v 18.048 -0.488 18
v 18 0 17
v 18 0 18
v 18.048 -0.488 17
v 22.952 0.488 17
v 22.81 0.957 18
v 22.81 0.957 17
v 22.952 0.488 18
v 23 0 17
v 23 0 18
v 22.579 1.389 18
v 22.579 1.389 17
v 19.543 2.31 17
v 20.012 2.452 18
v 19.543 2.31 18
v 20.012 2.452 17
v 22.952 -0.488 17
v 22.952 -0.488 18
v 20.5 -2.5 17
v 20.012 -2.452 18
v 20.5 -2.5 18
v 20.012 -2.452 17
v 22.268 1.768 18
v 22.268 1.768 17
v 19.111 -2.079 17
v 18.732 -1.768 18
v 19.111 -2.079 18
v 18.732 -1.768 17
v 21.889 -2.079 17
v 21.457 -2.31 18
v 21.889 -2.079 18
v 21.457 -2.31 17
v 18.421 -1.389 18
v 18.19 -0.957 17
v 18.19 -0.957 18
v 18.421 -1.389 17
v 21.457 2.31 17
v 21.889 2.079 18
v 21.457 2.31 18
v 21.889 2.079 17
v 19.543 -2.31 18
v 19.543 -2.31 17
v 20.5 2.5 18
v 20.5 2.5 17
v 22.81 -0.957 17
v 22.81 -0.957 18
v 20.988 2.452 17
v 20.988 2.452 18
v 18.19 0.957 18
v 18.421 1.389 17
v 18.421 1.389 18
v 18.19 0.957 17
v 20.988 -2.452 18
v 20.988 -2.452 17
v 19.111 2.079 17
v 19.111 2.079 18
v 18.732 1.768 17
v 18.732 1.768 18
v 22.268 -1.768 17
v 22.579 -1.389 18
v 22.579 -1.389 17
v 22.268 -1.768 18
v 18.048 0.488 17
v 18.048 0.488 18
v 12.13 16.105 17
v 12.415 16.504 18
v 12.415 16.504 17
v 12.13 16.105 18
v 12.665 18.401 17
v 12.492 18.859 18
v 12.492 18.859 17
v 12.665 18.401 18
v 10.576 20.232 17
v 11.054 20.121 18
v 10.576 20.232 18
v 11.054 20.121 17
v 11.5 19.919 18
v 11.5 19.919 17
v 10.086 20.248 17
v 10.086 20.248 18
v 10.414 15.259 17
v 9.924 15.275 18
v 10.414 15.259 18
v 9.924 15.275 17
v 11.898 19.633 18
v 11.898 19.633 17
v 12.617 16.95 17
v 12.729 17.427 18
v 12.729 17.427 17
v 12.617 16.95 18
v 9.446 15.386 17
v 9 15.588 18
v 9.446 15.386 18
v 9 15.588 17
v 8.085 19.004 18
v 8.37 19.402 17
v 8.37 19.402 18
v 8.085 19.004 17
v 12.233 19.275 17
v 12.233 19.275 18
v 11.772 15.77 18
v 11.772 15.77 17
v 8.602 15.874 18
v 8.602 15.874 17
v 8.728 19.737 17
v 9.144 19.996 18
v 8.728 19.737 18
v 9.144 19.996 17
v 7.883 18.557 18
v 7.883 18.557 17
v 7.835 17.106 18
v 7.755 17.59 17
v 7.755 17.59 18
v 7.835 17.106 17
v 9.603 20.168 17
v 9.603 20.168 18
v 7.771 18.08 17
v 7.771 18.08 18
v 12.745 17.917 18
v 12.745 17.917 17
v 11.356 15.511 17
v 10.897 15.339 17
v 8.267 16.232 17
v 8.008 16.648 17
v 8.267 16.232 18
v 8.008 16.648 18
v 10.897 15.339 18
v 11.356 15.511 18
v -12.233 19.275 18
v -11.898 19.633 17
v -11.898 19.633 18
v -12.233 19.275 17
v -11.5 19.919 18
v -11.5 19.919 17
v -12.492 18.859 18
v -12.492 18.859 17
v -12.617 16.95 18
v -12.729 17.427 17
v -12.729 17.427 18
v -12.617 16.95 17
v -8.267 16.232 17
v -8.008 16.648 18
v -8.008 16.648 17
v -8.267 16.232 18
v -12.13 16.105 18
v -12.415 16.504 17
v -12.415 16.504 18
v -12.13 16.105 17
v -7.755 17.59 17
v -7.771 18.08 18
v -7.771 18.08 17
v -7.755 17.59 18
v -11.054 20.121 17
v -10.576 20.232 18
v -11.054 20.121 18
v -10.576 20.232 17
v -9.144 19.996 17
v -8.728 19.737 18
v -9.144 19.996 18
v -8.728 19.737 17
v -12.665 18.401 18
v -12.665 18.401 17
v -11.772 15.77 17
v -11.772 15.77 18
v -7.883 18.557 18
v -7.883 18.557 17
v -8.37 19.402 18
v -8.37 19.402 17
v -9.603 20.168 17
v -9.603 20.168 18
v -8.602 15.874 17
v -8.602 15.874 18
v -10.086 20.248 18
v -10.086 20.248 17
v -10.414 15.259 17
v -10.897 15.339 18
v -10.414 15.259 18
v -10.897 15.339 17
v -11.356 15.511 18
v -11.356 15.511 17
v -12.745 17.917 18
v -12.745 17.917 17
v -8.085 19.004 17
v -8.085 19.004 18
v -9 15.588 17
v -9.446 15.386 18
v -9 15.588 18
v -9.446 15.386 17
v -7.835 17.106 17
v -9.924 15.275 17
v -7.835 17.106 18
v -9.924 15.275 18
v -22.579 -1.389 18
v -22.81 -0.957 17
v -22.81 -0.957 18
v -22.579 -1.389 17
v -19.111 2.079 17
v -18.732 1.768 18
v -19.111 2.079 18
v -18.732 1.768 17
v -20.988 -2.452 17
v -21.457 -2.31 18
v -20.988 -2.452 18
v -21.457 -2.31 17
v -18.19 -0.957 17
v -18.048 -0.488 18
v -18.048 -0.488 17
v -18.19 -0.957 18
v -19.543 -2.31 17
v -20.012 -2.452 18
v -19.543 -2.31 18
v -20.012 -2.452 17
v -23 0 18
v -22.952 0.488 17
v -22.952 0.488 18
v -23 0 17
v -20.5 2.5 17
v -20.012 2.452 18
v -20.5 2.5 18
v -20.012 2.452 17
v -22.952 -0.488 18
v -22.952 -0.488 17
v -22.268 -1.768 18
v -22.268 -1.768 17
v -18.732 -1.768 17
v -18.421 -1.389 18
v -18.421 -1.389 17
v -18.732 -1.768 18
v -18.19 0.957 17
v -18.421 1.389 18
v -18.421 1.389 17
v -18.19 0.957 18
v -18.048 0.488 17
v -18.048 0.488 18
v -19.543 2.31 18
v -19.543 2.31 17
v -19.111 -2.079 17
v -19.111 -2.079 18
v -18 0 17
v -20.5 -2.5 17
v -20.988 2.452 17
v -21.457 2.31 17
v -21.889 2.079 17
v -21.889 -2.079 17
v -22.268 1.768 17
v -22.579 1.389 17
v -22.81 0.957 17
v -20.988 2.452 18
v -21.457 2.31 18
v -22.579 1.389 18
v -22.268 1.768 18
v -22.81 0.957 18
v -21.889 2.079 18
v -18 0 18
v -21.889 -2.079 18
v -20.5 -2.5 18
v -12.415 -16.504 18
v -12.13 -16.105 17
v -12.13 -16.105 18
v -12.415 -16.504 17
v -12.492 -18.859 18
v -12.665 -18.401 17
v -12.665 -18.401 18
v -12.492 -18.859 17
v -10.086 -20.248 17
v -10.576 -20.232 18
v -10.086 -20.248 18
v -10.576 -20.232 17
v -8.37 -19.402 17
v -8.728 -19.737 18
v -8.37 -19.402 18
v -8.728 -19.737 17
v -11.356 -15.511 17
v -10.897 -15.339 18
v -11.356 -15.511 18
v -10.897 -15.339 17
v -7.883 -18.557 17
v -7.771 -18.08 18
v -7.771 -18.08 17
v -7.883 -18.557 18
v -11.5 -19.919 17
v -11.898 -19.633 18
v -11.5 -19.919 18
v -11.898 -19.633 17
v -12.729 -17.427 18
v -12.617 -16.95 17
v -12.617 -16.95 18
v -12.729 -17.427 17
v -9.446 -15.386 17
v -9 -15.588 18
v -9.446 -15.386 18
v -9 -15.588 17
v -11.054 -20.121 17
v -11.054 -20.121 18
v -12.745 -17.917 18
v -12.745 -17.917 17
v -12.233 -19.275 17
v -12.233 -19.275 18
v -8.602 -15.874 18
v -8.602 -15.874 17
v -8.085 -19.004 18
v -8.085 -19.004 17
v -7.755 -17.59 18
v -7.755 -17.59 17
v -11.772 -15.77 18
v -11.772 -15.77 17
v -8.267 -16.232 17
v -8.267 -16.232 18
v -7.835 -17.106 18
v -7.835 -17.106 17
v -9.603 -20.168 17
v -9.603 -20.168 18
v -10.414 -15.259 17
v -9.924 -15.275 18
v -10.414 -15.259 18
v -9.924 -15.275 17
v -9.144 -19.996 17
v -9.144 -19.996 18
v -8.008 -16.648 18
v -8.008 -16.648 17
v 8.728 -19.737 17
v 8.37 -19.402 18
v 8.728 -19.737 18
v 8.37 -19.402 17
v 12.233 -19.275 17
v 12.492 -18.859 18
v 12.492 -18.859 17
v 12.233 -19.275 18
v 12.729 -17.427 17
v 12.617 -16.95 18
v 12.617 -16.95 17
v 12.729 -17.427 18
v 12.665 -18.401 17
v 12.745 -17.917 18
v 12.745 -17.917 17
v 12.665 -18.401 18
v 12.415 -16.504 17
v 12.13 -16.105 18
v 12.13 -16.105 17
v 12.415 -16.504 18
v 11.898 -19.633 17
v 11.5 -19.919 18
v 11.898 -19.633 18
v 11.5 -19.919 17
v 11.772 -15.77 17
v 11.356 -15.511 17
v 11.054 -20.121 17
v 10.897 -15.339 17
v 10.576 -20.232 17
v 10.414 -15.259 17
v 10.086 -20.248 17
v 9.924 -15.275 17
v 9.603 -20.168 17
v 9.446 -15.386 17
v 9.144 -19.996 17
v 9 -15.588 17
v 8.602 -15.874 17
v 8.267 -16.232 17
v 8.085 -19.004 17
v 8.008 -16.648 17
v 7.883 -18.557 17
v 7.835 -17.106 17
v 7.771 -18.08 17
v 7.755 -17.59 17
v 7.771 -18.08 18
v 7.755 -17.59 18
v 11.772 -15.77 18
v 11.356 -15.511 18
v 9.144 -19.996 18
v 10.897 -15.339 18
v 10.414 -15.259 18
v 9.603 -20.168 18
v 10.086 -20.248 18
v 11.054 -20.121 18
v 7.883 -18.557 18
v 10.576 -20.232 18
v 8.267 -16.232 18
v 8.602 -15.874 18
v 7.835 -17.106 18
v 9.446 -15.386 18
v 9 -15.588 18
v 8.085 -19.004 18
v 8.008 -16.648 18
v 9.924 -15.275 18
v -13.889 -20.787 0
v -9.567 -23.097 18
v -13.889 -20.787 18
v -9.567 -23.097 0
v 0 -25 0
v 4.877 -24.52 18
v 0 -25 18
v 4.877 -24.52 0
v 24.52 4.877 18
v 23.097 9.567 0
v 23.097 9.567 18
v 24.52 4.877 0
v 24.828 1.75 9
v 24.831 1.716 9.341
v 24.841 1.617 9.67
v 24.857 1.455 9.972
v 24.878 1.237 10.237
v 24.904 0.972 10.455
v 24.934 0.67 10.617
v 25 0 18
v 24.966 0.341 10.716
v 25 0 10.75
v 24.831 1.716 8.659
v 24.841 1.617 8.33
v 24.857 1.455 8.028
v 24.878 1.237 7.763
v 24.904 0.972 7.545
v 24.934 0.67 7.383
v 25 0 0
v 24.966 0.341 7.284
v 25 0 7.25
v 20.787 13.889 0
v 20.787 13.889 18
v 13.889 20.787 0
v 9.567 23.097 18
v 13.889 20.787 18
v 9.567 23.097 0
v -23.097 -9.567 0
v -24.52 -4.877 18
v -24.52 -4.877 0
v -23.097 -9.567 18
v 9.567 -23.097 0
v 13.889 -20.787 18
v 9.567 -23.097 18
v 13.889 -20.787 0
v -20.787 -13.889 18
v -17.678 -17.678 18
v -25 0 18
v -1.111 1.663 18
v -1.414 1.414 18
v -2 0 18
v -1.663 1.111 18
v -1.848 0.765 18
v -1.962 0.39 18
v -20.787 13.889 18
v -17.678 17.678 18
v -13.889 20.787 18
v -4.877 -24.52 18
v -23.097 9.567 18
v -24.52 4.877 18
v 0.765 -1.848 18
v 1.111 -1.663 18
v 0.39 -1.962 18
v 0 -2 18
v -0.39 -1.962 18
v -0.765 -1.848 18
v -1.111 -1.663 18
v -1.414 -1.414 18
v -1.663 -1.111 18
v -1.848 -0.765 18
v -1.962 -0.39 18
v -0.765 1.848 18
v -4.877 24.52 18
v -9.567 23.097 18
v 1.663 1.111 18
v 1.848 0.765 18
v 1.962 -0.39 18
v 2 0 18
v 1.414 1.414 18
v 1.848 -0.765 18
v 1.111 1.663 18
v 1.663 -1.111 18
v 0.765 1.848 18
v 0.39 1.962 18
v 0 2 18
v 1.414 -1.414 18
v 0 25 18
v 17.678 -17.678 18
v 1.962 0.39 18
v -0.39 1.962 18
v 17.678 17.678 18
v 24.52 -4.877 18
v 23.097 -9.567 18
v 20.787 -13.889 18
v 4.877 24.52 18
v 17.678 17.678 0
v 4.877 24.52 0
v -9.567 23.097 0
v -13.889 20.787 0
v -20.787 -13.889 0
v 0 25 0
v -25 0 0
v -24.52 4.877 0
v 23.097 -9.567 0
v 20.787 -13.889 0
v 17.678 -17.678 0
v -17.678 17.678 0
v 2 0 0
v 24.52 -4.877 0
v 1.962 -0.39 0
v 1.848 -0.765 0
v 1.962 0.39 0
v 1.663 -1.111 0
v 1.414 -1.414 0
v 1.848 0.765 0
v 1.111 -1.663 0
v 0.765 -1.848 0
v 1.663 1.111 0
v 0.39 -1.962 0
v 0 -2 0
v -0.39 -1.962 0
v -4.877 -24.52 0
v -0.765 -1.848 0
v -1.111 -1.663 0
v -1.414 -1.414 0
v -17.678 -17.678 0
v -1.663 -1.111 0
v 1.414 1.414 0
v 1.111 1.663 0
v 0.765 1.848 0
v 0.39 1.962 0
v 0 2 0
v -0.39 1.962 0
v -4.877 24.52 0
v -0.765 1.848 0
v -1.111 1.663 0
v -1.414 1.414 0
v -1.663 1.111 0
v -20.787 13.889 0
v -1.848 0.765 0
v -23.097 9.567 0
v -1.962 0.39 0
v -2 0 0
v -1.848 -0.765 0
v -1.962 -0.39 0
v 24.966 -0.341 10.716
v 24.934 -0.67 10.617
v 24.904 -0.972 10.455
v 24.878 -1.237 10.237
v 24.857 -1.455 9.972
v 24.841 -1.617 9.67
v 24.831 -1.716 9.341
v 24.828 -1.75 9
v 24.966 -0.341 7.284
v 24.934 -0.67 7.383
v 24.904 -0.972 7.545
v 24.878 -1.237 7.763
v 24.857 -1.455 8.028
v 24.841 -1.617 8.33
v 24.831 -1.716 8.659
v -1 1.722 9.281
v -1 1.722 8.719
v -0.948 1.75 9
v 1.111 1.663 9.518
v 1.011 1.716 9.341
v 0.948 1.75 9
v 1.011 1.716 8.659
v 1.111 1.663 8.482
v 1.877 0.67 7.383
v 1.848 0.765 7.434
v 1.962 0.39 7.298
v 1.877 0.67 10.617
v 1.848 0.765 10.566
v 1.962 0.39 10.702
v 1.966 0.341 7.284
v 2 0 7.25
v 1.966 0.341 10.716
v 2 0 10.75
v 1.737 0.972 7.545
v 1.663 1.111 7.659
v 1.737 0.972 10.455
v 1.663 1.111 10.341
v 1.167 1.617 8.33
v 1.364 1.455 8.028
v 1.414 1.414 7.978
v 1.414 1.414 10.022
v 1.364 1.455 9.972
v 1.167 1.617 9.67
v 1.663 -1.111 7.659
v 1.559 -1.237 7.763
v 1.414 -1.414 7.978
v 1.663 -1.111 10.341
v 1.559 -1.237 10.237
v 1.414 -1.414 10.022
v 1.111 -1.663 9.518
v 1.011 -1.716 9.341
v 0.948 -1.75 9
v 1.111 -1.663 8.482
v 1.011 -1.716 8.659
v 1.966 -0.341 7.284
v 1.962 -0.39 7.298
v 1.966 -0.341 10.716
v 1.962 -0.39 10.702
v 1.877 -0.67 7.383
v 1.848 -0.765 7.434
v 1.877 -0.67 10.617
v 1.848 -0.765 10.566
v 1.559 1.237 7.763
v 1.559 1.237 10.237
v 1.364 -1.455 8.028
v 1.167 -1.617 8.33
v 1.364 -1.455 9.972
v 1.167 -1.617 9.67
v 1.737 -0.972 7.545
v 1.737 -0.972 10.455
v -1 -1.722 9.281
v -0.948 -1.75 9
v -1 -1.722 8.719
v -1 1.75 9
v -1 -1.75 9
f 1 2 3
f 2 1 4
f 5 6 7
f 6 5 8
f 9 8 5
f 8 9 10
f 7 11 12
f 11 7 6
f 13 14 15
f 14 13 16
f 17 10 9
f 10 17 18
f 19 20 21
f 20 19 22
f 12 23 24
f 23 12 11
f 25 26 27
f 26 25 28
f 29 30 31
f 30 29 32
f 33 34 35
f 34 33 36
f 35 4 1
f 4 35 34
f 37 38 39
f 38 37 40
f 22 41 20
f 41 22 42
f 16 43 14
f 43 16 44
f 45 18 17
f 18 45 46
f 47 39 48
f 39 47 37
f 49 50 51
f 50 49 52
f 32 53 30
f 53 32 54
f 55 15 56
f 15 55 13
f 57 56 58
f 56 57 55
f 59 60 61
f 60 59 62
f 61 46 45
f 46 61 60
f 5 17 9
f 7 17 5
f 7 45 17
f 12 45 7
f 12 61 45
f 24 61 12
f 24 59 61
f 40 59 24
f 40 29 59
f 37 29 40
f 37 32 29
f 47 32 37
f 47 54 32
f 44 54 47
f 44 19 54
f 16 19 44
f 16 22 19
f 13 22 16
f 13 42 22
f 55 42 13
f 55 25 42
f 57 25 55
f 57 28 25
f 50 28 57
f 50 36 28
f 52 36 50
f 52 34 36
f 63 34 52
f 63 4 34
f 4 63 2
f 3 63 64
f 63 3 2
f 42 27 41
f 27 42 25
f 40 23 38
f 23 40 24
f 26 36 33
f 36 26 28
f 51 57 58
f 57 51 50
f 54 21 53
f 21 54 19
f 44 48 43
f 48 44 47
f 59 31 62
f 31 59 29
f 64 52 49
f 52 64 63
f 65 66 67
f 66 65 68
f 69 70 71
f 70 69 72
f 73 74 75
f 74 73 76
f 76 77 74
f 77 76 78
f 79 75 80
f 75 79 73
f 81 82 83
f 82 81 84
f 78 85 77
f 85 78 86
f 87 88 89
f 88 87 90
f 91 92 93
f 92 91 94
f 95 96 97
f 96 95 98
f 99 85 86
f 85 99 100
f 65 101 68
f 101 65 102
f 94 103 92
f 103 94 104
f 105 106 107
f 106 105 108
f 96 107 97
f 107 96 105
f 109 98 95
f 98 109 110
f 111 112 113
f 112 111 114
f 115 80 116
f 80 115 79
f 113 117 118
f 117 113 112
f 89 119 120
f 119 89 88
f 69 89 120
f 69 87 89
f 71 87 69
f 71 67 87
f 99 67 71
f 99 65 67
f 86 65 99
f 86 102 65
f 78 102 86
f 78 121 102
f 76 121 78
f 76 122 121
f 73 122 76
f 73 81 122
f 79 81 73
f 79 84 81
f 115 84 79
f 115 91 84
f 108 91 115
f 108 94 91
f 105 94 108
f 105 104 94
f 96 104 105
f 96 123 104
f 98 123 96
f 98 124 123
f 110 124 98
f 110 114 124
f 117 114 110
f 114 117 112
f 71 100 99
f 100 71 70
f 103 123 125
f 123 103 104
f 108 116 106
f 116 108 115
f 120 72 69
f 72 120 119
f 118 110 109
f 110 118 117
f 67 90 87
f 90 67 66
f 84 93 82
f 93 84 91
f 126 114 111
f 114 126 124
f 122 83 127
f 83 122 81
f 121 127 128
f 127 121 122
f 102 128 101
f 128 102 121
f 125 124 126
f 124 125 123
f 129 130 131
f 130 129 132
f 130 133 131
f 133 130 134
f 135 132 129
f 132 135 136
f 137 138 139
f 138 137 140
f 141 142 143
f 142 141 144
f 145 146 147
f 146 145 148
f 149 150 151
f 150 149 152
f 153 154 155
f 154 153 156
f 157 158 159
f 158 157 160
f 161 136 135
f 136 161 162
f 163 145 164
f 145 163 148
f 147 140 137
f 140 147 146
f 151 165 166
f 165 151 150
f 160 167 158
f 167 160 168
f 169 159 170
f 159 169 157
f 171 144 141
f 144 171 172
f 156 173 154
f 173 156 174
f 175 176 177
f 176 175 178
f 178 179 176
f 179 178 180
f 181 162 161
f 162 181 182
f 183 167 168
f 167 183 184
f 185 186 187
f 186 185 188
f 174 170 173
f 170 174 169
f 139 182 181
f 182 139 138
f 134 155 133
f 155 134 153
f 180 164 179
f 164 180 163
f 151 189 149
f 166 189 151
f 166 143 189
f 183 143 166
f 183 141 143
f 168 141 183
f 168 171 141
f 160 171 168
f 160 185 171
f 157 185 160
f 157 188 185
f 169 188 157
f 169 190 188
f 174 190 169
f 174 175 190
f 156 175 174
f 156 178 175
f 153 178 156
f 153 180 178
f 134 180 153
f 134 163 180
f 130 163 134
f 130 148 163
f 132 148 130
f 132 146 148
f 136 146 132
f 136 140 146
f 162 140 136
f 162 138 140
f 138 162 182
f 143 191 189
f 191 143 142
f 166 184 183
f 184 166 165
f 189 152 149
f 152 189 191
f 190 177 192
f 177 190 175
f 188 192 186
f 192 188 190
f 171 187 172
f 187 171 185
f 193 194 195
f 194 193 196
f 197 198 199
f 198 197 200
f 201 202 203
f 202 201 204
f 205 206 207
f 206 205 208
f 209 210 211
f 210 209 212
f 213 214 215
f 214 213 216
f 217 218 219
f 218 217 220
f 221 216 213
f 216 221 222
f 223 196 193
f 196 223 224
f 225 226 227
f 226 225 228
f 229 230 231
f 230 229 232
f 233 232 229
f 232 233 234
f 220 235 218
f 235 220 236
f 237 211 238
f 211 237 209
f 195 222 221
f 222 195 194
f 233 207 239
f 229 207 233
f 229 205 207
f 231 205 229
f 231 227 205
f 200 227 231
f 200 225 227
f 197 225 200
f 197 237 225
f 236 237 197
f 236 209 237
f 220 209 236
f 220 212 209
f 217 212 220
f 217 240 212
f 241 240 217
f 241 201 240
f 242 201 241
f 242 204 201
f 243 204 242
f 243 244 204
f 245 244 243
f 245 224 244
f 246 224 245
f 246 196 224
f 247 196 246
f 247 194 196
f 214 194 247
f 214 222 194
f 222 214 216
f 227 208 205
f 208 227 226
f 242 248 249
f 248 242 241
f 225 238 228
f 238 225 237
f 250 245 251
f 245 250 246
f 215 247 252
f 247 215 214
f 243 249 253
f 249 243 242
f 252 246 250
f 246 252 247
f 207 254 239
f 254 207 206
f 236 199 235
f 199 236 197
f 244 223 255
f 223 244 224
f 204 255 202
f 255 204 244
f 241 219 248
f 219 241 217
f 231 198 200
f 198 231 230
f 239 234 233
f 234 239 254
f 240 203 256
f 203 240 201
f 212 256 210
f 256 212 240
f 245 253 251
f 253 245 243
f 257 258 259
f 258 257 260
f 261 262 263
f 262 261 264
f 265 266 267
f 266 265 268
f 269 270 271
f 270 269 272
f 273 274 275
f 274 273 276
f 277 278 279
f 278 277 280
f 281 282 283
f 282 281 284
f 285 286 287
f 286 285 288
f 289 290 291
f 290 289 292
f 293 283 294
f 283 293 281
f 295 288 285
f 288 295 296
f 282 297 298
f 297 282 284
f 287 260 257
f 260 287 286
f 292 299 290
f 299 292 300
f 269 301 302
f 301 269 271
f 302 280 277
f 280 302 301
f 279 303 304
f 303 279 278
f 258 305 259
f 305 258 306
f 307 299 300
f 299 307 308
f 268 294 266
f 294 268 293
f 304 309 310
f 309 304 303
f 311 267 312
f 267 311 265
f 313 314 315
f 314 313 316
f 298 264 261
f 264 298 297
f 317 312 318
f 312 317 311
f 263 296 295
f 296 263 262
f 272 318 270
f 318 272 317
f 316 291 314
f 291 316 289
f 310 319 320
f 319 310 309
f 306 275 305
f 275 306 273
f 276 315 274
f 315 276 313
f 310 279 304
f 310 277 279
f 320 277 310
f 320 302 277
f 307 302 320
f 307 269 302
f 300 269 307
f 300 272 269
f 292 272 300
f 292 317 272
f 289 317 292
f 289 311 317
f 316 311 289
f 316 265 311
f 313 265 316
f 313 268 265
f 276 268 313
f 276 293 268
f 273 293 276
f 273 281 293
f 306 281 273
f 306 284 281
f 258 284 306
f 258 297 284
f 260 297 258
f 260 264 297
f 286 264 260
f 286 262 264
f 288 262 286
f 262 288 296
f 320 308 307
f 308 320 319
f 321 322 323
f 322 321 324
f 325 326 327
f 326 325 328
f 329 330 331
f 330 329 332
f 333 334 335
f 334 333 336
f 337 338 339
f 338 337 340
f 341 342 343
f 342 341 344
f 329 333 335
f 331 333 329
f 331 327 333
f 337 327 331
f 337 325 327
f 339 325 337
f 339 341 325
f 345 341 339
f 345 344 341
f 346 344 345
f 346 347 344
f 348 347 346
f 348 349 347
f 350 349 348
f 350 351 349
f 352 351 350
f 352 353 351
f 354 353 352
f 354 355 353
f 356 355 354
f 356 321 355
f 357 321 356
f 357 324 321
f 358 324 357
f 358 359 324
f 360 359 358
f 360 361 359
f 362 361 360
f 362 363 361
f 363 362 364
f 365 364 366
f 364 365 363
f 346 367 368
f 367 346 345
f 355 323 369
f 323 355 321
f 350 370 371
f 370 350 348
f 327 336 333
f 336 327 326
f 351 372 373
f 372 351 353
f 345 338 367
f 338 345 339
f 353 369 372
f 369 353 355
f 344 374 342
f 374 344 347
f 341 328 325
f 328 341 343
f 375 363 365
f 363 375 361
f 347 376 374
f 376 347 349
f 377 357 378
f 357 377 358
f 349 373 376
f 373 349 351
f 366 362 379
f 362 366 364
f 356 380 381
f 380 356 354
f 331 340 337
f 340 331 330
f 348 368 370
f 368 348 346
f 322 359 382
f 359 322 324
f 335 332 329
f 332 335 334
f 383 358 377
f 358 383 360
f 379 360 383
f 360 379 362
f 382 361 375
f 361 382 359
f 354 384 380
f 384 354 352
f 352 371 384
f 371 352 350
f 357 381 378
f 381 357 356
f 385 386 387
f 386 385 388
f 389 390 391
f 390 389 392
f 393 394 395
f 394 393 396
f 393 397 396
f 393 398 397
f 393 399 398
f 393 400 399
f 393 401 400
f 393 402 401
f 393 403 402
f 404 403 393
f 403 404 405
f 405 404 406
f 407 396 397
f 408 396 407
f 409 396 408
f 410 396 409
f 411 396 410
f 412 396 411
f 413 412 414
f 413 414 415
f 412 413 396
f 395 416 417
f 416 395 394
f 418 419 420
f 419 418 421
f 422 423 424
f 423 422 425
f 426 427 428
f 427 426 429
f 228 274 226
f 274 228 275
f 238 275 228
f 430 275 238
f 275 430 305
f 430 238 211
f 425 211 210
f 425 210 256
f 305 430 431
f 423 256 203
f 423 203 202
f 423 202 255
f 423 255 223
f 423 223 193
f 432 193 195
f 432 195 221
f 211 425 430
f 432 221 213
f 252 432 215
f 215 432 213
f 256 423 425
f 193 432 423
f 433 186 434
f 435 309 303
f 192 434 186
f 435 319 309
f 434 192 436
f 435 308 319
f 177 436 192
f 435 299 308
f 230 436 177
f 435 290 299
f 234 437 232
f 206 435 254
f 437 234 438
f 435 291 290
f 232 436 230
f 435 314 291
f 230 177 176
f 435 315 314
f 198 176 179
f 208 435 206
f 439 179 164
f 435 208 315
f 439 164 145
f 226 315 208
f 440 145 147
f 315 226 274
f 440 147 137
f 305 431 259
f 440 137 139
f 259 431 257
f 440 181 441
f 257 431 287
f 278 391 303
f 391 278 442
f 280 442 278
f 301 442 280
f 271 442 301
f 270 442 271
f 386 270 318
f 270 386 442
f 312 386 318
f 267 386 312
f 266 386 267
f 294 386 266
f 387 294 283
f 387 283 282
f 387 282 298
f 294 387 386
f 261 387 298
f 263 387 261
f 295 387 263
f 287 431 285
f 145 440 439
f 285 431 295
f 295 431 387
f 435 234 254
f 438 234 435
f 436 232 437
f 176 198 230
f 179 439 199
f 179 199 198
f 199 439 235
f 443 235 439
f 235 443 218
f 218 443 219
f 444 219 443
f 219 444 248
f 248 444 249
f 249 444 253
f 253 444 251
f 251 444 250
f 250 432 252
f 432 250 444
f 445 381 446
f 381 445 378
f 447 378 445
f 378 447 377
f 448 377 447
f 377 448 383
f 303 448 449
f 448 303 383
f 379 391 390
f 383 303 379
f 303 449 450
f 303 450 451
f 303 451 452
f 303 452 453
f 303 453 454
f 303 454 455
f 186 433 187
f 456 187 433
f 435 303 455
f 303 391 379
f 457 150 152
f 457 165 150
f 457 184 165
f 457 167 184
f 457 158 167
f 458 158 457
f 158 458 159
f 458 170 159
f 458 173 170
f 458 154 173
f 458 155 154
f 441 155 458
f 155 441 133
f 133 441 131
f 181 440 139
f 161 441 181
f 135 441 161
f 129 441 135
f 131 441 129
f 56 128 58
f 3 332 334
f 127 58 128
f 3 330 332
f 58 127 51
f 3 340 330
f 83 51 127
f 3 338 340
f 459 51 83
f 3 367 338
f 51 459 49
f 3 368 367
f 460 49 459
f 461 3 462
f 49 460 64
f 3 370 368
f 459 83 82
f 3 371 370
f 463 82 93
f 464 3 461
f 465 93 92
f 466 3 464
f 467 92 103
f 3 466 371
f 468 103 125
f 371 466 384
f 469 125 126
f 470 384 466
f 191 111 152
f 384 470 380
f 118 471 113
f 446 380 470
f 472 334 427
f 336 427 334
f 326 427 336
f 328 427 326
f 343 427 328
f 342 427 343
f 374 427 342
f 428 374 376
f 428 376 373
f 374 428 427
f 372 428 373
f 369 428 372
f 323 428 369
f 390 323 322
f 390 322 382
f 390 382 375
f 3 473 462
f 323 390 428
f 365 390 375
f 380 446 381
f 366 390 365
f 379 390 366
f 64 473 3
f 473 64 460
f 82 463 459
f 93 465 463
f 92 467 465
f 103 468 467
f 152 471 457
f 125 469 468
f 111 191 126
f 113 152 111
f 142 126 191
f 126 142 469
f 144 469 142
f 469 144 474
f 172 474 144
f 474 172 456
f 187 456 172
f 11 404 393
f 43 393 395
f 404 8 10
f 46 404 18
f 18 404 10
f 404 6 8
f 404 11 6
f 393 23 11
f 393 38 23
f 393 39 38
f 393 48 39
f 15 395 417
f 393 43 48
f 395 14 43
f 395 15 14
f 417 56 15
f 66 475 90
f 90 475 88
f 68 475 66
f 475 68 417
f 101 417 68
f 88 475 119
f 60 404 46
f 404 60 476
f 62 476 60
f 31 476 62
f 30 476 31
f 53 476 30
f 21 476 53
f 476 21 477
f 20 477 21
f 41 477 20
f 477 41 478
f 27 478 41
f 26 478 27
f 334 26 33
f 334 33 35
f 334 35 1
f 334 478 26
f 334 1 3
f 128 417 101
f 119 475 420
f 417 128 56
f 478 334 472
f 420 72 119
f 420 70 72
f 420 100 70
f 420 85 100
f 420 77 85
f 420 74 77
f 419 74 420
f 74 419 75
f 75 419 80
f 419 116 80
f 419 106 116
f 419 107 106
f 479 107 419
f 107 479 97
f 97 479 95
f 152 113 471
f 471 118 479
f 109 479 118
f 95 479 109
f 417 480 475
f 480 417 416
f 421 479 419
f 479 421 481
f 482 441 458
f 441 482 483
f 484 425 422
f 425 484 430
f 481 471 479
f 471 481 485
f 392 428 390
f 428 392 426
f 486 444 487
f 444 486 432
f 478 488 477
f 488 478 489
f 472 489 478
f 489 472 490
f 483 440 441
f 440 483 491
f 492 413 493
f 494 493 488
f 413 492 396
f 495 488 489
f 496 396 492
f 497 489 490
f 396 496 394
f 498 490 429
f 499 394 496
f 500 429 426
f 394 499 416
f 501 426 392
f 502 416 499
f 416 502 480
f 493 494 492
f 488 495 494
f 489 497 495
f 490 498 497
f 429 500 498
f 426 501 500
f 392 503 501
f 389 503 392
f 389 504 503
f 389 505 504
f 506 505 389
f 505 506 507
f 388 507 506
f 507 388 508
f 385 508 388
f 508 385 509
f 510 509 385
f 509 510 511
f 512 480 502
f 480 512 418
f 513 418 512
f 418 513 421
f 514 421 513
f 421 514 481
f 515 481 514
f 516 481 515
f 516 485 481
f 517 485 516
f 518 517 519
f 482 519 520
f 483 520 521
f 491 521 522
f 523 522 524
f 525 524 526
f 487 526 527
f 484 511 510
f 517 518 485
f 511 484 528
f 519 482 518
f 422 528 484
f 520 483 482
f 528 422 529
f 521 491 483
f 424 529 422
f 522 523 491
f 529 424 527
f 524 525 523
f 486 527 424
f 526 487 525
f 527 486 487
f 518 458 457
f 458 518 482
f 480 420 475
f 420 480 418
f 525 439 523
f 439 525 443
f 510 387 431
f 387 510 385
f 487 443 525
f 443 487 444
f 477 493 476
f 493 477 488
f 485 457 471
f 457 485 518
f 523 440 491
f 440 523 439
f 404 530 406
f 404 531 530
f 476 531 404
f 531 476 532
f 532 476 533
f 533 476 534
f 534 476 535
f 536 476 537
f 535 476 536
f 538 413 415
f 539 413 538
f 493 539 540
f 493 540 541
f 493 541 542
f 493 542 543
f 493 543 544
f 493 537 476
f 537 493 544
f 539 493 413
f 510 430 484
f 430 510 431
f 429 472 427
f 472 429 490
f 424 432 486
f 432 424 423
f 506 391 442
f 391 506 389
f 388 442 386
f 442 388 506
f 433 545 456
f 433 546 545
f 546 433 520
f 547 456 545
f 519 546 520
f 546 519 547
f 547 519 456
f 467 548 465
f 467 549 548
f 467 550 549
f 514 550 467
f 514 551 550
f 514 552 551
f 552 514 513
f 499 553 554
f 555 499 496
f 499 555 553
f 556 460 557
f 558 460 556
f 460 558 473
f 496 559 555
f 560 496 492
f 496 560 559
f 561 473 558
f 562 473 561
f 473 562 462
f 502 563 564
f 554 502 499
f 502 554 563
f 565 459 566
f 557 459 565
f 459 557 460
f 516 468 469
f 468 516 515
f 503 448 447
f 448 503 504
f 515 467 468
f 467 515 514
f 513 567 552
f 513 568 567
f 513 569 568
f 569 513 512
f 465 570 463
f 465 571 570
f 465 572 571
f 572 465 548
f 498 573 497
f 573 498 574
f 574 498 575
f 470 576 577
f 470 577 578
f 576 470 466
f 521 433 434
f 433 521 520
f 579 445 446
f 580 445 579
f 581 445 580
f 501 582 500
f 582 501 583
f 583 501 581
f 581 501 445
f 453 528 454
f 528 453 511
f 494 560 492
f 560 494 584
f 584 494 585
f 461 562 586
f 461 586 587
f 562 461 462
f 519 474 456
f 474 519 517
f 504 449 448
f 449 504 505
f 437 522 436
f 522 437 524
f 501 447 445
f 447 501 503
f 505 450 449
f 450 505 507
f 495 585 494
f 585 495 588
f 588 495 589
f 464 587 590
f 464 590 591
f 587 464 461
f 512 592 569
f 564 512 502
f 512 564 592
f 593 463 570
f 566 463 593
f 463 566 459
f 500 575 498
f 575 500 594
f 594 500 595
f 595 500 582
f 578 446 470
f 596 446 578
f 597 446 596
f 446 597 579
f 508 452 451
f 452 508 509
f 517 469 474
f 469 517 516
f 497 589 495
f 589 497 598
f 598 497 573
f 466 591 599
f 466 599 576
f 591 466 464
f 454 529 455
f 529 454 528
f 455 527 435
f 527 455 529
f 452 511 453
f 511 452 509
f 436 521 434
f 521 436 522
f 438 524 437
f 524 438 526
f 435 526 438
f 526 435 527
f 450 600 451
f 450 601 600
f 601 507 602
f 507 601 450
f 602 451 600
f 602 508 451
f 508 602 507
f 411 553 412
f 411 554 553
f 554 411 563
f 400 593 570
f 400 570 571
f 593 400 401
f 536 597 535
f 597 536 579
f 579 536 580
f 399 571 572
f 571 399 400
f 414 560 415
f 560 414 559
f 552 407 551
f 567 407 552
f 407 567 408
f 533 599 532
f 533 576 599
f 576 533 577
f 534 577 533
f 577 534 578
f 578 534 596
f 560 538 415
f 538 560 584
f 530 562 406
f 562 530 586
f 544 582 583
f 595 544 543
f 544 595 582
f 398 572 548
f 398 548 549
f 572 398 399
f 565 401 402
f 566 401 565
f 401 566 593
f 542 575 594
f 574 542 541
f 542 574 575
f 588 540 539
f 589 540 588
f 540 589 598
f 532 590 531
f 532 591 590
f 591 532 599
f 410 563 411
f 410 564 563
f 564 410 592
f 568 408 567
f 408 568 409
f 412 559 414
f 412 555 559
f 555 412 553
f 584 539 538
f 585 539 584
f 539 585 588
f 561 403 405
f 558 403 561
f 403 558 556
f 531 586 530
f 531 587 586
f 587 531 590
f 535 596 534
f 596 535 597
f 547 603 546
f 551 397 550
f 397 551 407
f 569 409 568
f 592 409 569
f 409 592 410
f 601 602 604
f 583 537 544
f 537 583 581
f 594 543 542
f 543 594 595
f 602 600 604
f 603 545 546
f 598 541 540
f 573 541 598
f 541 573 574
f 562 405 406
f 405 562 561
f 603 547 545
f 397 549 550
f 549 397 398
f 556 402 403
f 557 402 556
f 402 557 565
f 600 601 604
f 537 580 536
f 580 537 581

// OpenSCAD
$fn = 32;

// ----------------------------------------------------------------------
// Control knob: dimpled knob
// ----------------------------------------------------------------------

// --- parameters (mm) ---
dimp_d = 5;               // finger dimple diameter
n_dimp = 6;               // number of dimples
dimp_r = 20.5;            // dimple ring radius
knob_d = 50;              // knob body diameter
knob_h = 18;              // knob body height
bore_d = 4;               // shaft bore diameter
set_d = 3.5;              // set screw bore diameter

dimp_step = 360 / n_dimp;  // dimple angular step

difference() {
  cylinder(h = knob_h, d = knob_d);
  translate([0, 0, -1]) cylinder(h = knob_h + 2, d = bore_d);
  translate([-1, 0, knob_h / 2]) rotate([0, 90, 0])
    cylinder(h = knob_d / 2 + bore_d / 2 + 2, d = set_d);  for (i = [0 : n_dimp - 1])
    rotate([0, 0, i * dimp_step])
      translate([dimp_r, 0, knob_h - 1])
        cylinder(h = 2, d = dimp_d);
}
